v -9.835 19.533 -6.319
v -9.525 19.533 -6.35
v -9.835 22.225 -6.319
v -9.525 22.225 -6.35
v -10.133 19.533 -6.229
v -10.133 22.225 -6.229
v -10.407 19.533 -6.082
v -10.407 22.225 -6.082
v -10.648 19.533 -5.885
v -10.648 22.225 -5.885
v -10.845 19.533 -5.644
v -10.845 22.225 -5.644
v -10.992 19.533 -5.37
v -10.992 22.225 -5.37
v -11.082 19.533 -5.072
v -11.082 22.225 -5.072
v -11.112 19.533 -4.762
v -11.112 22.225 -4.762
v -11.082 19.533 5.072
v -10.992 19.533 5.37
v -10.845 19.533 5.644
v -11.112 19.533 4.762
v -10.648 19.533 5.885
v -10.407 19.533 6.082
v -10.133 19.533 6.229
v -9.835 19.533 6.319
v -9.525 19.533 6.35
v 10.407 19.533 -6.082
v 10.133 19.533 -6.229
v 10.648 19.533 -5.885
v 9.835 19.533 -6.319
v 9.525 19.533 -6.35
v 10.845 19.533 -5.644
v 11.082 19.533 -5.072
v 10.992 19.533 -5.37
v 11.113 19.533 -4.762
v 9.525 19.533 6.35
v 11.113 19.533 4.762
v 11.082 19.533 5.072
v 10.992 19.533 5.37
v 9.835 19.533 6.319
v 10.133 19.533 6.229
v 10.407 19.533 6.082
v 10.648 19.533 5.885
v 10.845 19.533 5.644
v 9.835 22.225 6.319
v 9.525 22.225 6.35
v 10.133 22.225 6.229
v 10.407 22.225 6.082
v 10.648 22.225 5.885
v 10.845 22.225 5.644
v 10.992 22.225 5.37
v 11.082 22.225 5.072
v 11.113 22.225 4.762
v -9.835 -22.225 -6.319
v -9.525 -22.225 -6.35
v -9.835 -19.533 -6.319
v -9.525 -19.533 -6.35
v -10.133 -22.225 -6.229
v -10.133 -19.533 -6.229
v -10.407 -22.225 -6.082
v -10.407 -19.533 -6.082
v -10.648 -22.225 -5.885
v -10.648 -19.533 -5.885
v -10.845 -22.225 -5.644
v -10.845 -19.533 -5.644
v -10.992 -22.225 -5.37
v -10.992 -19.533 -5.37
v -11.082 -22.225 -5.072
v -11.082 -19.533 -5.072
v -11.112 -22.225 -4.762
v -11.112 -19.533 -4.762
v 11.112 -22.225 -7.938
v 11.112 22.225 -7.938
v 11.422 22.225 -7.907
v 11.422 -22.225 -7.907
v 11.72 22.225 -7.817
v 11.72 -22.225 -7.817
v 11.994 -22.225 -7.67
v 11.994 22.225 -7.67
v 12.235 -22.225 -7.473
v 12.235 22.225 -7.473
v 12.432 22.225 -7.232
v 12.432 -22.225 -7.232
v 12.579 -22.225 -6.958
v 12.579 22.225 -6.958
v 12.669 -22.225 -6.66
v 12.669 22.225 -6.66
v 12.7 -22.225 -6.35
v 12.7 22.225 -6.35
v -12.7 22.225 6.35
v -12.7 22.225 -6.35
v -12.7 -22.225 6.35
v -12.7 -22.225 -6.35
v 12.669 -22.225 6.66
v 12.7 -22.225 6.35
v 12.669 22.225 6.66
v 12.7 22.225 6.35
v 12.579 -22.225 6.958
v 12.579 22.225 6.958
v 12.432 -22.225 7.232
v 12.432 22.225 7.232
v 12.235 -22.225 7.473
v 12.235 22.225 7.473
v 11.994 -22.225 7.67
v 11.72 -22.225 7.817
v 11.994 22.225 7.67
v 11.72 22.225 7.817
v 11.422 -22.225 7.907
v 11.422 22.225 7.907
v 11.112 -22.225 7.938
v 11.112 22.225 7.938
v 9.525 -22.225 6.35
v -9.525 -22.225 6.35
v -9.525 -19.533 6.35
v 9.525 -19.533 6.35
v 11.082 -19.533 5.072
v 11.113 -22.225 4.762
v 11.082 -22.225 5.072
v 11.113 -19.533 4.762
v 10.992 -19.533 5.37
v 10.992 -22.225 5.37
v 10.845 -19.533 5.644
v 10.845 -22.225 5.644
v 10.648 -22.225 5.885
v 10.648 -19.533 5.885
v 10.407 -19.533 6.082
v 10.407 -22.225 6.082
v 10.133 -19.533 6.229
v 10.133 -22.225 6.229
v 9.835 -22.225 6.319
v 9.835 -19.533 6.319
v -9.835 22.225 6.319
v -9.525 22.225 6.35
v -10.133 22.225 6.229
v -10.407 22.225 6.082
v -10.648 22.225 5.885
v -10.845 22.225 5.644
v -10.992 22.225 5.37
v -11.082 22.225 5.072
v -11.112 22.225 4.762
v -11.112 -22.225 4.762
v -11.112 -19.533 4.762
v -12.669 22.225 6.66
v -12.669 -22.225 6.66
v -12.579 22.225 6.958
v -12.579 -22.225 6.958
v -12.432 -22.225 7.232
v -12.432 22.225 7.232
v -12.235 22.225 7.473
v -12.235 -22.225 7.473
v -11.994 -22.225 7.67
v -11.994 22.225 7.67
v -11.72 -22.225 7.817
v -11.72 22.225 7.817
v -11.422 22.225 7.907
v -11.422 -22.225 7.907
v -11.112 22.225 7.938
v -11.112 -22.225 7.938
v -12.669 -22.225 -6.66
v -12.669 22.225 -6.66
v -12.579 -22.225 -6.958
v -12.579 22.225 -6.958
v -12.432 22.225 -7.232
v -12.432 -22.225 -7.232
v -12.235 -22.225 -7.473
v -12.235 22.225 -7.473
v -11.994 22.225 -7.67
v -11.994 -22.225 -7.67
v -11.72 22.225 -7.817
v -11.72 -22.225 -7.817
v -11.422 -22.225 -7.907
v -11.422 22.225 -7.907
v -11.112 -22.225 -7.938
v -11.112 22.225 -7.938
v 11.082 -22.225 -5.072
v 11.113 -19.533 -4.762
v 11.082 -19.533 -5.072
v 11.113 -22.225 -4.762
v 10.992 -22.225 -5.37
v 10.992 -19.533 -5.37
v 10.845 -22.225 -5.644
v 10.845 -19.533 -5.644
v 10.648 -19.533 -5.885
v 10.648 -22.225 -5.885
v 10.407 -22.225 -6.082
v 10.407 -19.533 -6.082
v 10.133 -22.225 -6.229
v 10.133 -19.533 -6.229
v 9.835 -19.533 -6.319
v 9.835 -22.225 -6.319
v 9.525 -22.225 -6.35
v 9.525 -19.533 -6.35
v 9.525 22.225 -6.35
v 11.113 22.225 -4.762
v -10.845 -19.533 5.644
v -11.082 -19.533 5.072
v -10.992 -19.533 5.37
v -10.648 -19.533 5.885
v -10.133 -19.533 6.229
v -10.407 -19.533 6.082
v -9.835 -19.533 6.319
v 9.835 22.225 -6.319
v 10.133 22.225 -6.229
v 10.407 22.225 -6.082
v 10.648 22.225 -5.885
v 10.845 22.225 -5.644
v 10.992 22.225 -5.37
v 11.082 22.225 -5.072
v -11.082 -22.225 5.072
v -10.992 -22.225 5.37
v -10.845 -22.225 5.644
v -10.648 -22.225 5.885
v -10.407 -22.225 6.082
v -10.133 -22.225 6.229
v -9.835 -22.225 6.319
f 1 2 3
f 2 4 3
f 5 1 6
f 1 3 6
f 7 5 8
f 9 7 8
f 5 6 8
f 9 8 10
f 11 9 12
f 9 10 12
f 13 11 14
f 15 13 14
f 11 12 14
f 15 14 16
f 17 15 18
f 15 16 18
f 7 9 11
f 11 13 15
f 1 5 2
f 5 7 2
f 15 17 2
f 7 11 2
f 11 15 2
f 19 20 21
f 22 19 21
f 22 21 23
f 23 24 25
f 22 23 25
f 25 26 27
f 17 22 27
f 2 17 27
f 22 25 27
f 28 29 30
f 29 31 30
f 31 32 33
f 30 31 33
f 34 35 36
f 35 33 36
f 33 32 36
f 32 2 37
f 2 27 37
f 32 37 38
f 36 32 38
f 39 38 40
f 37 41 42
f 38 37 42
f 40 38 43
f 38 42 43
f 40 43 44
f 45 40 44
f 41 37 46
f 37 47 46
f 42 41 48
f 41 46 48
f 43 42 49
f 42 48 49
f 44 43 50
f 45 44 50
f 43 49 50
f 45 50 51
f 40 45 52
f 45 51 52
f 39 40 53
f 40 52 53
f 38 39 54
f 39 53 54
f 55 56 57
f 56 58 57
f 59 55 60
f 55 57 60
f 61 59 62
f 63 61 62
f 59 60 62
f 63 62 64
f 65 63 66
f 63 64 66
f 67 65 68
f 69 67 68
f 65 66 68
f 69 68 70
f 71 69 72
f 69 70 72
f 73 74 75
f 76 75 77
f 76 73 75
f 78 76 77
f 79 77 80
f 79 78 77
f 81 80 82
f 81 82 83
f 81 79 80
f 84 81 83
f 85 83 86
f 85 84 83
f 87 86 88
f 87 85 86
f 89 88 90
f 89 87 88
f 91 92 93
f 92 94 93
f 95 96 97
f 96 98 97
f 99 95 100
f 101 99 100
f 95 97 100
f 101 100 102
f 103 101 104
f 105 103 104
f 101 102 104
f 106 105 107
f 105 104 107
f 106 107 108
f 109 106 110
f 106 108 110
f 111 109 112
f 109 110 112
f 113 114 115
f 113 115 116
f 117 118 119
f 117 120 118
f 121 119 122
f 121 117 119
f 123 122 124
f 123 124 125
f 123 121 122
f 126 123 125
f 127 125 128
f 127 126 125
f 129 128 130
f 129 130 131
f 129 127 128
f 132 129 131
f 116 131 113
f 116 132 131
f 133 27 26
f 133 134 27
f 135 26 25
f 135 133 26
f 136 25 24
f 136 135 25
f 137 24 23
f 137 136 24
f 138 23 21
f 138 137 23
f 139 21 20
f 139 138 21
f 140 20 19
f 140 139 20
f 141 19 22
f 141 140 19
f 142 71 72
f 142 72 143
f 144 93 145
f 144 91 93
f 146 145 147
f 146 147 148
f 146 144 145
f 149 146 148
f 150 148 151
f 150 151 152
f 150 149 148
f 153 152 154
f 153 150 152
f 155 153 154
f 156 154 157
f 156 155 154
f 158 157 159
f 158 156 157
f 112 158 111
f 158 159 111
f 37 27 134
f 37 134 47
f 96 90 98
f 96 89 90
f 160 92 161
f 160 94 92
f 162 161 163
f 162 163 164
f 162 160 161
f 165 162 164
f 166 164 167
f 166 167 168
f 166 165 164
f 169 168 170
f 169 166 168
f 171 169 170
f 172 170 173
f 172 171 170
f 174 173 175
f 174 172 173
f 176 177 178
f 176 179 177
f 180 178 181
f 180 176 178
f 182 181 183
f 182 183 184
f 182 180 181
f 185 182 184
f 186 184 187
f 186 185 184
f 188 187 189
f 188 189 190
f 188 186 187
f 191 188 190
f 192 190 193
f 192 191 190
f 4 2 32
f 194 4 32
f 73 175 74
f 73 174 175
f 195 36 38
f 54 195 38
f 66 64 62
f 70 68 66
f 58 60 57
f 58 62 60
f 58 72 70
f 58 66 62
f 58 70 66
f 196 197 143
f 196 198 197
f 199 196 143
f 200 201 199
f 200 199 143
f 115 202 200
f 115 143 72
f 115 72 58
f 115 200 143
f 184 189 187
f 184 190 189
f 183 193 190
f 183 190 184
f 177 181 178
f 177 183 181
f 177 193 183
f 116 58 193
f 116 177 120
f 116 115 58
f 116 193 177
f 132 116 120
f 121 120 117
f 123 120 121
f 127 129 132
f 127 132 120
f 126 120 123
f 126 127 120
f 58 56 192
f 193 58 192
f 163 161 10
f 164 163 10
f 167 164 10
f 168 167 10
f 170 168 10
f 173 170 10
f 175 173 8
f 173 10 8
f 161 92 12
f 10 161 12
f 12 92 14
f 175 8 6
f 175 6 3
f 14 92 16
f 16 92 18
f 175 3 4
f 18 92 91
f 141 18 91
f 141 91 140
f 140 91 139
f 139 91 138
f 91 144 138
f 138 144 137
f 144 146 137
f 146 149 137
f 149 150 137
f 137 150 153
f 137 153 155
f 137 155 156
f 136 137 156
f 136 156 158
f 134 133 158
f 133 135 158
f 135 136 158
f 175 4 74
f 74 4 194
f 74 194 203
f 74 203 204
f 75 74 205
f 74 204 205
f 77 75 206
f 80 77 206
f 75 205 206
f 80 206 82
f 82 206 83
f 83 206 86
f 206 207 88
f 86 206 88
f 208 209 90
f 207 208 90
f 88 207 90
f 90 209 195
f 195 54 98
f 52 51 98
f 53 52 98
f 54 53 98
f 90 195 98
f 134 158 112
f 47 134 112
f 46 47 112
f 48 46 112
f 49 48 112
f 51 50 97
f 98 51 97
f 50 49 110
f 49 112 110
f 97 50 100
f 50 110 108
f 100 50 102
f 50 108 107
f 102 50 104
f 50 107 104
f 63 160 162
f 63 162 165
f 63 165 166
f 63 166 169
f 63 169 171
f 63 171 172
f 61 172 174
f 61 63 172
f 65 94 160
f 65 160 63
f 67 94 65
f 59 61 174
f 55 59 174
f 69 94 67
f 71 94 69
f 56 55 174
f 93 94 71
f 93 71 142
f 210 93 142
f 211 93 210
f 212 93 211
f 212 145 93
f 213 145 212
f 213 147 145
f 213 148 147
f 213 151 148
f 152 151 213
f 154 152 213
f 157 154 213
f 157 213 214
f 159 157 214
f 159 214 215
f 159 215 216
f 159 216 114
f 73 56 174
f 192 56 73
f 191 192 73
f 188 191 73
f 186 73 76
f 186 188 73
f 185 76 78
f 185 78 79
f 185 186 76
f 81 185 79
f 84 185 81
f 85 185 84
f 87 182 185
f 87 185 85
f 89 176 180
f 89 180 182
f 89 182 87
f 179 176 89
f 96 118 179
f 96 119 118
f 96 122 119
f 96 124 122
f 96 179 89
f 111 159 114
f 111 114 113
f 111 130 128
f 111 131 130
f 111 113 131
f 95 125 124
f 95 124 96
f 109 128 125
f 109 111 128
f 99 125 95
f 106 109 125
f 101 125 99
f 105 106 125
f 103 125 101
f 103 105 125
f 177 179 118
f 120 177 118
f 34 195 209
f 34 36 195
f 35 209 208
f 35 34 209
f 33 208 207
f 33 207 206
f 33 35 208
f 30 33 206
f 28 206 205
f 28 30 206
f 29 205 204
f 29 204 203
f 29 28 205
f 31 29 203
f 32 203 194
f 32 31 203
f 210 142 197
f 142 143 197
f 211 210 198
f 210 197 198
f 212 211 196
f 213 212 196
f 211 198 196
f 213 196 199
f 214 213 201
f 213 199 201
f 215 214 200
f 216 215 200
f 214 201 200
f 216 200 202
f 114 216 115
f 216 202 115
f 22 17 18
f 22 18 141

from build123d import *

# Parameters (mm, degrees)
F0_W     = 25.4
F0_H     = 15.875
F1_DEPTH = 22.225
F2_T     = -1.5875
F3_W     = 23.8125
F3_H     = 14.2875
F4_DEPTH = 19.5326
F5_R     = 1.5875
F6_R     = 1.5875


with BuildPart() as f1:
    # F0 (on Front) → F1 (new body, symmetric)
    with BuildSketch(Plane.XZ):
        Rectangle(F0_W, F0_H)
    extrude(amount=F1_DEPTH, both=True)

    # F2
    f2_openings = [f1.faces().sort_by_distance(p)[0] for p in [
        (0, -22.225, 0),
        (0, 22.225, 0),
    ]]
    offset(amount=F2_T, openings=f2_openings)

    # F3 (on Front) → F4 (join, symmetric)
    with BuildSketch(Plane.XZ):
        Rectangle(F3_W, F3_H)
    extrude(amount=F4_DEPTH, both=True)

    # F5
    f5_edges = [f1.edges().sort_by_distance(p)[0] for p in [
        (-11.1125, -20.8788, 6.35),
        (11.1125, -20.8788, 6.35),
        (11.1125, -20.8788, -6.35),
        (-11.1125, -20.8788, -6.35),
        (-11.1125, 20.8788, -6.35),
        (11.1125, 20.8788, -6.35),
        (-11.1125, 20.8788, 6.35),
        (11.1125, 20.8788, 6.35),
    ]]
    fillet(f5_edges, radius=F5_R)

    # F6
    f6_edges = [f1.edges().sort_by_distance(p)[0] for p in [
        (-12.7, 0, -7.9375),
        (-12.7, 0, 7.9375),
        (12.7, 0, 7.9375),
        (12.7, 0, -7.9375),
    ]]
    fillet(f6_edges, radius=F6_R)


solid = f1.part
